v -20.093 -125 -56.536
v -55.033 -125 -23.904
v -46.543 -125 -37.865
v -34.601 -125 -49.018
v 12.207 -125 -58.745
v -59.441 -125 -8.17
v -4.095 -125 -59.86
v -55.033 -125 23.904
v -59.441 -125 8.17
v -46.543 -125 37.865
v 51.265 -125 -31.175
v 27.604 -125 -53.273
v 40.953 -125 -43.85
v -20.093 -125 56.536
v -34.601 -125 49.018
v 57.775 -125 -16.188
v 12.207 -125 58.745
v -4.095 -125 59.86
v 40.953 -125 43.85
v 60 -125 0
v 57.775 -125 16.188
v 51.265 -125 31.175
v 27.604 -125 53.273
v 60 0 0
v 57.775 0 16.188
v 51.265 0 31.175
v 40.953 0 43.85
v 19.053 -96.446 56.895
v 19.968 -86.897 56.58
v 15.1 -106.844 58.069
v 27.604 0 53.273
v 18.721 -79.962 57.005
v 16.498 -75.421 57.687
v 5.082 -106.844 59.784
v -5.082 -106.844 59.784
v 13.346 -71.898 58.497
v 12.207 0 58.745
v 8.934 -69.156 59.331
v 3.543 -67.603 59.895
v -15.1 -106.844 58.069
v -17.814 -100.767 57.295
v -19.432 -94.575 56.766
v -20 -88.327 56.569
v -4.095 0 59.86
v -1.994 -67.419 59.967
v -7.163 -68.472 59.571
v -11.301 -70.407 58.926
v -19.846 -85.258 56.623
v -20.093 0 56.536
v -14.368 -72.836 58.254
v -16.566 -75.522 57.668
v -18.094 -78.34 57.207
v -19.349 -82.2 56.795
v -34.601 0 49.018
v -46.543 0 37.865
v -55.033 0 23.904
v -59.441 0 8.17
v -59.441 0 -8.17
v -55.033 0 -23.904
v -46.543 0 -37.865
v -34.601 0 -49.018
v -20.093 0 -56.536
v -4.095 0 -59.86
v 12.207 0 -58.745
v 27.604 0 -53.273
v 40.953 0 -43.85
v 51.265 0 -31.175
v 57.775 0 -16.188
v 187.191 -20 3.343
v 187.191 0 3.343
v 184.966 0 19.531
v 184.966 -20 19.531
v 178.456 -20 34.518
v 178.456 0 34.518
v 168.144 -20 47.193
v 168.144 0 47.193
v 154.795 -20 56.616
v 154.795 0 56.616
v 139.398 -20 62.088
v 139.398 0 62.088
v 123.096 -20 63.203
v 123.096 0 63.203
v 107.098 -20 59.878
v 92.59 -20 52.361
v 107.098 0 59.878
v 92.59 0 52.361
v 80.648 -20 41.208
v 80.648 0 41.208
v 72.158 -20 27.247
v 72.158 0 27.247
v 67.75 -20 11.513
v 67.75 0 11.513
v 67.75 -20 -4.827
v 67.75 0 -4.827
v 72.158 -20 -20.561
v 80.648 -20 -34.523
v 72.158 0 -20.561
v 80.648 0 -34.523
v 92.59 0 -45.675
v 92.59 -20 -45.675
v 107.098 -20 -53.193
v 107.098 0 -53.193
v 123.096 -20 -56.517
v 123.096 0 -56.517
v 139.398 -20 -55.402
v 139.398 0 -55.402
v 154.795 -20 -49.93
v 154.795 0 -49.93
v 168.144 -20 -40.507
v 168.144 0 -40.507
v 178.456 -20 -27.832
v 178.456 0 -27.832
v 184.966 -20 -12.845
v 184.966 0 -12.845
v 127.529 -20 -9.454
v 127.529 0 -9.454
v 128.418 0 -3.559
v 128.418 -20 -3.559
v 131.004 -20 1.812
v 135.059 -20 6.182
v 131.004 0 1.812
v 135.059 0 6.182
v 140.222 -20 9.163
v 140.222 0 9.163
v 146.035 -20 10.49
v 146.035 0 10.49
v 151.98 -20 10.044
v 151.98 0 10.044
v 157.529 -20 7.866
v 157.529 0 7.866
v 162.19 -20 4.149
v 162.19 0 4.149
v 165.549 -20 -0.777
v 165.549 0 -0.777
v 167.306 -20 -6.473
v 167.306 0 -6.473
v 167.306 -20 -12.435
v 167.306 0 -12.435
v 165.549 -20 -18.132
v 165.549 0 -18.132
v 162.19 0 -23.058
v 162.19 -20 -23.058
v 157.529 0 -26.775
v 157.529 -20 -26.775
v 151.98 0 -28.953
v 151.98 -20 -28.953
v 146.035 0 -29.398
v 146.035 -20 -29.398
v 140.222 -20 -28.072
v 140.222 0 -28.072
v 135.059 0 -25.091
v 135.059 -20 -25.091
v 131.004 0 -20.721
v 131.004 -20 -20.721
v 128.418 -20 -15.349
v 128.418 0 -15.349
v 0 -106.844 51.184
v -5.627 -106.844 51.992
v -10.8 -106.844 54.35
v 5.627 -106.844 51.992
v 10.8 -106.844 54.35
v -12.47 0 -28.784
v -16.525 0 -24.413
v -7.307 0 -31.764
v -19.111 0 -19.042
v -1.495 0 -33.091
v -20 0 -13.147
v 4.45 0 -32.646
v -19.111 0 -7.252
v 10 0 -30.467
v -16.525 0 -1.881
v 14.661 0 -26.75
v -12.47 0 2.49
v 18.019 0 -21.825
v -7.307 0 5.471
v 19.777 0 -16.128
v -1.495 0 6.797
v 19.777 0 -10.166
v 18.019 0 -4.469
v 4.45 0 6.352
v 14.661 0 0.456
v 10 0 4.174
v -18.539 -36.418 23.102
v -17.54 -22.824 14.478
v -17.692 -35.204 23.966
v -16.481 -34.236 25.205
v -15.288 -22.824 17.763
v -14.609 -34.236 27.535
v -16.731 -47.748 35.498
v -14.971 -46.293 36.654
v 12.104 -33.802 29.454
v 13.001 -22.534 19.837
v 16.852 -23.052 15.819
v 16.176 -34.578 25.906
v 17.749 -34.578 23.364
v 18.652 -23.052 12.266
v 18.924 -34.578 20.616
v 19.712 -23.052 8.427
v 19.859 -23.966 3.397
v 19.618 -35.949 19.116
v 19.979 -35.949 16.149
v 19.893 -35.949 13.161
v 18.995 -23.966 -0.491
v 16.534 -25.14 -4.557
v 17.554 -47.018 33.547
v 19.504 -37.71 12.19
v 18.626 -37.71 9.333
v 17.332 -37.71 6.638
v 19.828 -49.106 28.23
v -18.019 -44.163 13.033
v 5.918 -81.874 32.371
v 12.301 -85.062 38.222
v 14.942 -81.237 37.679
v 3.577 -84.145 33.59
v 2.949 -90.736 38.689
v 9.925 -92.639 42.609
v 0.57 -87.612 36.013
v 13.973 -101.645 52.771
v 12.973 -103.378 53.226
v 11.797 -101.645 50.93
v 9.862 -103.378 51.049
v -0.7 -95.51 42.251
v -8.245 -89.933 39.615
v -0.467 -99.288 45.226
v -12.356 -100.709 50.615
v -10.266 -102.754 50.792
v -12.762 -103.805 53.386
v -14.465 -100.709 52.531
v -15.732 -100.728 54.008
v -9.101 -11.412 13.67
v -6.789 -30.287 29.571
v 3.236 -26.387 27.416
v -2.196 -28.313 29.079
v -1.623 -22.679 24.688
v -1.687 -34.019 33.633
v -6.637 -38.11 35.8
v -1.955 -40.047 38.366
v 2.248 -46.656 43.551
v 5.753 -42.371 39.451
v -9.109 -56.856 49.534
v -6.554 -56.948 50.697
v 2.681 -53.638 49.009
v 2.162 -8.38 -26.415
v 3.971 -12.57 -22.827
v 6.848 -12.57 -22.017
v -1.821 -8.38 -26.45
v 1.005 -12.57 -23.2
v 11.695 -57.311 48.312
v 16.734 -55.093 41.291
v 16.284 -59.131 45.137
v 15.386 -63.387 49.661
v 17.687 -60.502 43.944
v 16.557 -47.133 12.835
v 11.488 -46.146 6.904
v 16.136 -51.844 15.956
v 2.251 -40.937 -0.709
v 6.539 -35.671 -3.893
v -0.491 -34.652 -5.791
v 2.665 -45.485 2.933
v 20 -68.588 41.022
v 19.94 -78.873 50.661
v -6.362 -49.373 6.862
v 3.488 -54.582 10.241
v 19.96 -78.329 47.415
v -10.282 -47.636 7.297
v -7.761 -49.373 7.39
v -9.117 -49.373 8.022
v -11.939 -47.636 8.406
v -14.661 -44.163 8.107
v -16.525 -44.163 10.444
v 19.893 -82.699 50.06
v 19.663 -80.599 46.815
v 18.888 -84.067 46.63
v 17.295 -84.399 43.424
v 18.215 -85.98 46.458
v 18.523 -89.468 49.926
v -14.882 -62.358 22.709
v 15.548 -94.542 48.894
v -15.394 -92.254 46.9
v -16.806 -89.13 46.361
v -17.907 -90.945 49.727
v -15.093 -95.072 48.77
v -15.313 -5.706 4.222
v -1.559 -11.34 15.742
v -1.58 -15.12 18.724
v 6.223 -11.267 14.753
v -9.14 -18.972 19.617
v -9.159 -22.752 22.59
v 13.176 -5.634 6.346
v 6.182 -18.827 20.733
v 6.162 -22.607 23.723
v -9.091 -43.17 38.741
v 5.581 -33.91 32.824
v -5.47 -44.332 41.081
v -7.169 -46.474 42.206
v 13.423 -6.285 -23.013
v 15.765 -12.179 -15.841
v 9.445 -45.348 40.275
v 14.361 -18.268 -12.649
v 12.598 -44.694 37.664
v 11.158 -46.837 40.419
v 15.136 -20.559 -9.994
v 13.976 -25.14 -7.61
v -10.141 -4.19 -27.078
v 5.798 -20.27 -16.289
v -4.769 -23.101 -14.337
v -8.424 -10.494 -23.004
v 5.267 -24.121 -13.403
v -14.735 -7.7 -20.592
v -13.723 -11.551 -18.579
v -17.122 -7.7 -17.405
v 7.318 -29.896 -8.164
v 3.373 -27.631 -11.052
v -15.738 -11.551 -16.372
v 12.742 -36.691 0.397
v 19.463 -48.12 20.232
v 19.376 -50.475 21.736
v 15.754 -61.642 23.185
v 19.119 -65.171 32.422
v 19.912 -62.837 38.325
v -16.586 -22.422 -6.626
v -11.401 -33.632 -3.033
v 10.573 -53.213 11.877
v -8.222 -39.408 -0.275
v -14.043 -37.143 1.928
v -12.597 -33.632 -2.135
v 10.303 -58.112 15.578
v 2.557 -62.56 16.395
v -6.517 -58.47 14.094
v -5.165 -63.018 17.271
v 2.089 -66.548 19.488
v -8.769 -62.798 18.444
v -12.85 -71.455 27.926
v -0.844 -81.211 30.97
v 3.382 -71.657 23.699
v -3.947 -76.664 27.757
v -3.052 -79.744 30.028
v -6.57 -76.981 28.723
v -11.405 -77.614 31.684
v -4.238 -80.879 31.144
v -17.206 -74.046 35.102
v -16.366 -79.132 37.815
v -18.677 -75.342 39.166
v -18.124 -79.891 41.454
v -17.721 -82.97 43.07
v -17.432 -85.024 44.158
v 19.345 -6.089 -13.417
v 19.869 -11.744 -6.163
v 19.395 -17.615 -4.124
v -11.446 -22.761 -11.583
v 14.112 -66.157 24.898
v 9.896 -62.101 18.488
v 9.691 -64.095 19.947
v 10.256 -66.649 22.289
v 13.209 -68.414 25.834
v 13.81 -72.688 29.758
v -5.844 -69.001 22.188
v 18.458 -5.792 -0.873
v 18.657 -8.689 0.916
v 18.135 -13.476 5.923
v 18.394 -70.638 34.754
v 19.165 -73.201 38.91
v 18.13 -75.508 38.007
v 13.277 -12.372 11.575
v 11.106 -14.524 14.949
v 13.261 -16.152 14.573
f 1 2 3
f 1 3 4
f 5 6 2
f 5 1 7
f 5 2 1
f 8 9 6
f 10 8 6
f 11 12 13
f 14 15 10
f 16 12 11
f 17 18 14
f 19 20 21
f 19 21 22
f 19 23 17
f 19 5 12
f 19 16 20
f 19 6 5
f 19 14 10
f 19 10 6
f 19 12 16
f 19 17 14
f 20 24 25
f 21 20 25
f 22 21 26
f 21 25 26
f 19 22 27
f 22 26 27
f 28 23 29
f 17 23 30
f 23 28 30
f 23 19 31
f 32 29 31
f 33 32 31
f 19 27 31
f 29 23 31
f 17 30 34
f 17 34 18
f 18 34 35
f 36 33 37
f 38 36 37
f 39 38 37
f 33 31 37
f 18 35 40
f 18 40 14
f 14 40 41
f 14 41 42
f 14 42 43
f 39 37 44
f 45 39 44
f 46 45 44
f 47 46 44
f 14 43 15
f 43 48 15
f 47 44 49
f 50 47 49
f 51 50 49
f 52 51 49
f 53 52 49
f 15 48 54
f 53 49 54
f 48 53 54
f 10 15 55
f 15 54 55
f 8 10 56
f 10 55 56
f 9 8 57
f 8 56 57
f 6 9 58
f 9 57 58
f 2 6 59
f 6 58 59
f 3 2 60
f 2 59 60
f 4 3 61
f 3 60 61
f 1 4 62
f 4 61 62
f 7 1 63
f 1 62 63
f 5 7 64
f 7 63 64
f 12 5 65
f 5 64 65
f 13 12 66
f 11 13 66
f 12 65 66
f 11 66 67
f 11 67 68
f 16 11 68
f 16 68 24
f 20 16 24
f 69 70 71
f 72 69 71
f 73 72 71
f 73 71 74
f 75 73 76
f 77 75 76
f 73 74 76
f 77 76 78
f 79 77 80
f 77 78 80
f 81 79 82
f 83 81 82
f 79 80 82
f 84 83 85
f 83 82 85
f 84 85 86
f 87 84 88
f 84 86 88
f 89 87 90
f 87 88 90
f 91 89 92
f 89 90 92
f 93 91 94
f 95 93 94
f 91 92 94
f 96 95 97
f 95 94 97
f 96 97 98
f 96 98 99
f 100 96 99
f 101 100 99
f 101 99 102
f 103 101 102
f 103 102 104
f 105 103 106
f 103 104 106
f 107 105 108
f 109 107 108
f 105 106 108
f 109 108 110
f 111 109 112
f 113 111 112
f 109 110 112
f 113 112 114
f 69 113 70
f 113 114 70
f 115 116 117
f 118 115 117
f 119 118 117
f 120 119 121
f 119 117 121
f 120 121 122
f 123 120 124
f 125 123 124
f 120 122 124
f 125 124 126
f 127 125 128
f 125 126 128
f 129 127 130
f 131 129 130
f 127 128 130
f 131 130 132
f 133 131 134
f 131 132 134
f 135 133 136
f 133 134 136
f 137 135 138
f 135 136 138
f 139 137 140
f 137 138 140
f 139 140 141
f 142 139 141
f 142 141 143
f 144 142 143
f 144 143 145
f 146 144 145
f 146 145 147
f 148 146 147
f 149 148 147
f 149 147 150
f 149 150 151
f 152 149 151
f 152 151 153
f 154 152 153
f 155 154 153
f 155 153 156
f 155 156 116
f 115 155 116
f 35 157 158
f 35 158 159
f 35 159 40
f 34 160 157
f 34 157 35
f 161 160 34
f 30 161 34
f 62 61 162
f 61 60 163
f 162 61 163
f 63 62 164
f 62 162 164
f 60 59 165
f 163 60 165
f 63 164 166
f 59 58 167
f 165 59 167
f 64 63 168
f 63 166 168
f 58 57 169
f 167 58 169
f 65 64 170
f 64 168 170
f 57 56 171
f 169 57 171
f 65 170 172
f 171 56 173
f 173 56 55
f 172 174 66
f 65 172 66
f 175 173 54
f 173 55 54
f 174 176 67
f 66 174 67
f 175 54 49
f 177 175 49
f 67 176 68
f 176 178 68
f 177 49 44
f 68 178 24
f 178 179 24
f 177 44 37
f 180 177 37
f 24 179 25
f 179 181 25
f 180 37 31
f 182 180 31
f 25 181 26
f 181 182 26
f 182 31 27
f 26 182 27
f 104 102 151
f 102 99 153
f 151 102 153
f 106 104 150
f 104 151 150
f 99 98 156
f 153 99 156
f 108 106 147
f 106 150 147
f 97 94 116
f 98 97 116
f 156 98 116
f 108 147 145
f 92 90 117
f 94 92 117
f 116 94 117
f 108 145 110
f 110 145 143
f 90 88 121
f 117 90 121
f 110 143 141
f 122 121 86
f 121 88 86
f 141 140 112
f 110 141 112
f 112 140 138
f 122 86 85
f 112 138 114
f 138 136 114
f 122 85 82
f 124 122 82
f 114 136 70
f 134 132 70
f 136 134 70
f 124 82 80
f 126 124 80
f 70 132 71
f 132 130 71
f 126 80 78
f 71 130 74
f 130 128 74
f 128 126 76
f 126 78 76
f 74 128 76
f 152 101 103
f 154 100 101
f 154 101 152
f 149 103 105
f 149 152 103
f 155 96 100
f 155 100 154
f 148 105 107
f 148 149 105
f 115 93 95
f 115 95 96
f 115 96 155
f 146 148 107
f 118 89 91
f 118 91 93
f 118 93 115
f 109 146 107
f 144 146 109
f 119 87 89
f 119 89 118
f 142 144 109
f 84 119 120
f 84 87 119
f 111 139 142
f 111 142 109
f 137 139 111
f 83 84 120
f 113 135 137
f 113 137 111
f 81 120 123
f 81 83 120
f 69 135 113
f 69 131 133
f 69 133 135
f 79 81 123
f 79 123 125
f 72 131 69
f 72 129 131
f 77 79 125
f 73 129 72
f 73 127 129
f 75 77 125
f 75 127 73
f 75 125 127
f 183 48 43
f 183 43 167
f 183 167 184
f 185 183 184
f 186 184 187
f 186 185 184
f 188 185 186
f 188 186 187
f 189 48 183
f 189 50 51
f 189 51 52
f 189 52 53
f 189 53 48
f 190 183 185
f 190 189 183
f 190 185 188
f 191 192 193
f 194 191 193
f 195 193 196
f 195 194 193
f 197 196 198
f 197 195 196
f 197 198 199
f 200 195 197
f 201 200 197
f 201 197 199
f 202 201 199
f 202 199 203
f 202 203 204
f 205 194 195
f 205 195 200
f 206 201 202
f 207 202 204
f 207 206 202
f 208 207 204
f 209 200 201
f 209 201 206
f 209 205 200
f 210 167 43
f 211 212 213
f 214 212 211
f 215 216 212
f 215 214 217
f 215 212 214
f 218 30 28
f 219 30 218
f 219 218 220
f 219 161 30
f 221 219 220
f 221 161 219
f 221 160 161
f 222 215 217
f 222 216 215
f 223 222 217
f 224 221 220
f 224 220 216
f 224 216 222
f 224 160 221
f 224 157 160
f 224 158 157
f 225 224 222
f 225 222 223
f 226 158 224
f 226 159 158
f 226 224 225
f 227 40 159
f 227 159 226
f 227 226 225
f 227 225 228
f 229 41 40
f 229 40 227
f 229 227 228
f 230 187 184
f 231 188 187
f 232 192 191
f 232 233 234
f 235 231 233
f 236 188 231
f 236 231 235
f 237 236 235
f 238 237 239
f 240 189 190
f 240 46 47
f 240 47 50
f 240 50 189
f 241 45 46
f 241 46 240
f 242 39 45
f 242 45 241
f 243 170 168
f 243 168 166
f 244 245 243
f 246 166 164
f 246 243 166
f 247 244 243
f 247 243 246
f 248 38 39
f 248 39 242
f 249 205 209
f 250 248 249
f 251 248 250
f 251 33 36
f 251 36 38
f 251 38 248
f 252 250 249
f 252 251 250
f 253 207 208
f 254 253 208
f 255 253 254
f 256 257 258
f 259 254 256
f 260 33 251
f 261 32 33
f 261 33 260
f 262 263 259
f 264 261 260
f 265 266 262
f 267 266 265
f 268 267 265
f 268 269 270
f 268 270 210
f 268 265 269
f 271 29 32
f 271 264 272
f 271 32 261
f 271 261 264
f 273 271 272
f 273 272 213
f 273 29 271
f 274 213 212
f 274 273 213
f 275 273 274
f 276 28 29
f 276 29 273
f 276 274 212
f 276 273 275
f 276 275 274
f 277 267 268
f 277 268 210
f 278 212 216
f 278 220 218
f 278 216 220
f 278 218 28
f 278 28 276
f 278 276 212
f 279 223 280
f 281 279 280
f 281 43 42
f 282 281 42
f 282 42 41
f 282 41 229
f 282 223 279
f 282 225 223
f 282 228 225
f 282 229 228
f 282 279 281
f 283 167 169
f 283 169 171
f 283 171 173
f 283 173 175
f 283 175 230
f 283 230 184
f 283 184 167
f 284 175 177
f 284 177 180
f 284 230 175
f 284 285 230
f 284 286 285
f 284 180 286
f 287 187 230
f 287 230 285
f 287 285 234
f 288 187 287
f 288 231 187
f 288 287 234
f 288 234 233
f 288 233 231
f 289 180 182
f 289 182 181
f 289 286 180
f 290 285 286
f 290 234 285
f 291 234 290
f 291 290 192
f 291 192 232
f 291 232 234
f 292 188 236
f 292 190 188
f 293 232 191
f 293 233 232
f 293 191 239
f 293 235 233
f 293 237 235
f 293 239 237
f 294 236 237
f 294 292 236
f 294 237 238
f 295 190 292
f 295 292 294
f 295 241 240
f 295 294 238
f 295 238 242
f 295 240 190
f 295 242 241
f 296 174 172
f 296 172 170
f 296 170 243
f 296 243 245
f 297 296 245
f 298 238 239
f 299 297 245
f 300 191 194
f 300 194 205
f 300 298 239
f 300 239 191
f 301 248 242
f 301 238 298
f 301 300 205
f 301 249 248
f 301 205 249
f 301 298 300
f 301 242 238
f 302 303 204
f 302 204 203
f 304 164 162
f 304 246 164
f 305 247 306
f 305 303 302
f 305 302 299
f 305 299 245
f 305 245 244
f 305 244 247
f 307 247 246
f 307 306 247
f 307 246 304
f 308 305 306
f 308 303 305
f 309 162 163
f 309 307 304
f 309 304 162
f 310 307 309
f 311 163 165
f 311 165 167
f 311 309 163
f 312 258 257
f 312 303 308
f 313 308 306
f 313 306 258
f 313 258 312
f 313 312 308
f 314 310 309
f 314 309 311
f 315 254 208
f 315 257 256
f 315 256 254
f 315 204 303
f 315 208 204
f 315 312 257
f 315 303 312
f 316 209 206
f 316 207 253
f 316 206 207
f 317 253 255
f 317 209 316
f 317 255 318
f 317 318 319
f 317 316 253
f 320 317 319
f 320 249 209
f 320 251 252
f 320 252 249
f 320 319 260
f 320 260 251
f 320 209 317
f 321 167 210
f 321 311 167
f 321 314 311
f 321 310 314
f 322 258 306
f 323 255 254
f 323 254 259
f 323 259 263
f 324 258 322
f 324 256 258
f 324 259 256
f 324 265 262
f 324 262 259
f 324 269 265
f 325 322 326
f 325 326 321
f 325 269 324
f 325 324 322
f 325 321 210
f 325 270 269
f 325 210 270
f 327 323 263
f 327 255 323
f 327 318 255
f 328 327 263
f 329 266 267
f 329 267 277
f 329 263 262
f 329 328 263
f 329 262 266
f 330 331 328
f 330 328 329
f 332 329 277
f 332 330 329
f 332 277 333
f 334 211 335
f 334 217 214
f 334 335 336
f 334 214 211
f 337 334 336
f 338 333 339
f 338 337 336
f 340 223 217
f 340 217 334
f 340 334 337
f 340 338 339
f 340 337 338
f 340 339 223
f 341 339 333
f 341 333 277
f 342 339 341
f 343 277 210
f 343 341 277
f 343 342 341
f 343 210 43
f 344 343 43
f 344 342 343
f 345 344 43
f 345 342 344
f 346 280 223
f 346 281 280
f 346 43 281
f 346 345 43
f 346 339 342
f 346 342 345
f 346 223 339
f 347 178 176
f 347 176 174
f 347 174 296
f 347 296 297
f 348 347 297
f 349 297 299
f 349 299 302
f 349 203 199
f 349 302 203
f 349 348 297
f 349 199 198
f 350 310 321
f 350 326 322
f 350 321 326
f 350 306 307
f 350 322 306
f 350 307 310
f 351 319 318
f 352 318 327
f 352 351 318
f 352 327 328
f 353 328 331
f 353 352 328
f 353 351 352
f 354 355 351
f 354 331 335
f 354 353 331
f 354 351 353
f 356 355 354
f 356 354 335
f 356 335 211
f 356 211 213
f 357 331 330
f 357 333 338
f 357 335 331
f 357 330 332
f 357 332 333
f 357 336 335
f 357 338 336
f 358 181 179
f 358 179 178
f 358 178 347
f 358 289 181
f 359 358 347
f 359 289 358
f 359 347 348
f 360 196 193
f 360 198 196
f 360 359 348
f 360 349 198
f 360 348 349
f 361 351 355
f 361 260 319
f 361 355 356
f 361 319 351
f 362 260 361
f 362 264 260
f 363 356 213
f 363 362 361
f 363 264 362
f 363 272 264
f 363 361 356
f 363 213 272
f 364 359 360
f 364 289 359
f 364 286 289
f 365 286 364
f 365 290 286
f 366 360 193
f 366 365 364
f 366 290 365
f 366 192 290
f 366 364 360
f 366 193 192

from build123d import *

# Parameters (mm, degrees)
F0_R     = 60
F1_DEPTH = 125
F2_R     = 20
F5_R     = 60
F6_DEPTH = 20
F7_R     = 20
F8_DEPTH = 30


with BuildPart() as f1:
    # F0 (on Front) → F1 (new body)
    with BuildSketch(Plane.XZ):
        Circle(F0_R)
    extrude(amount=F1_DEPTH)

    # F4: sweep along a path in F3
    with BuildLine(Plane.YZ) as f4_path:
        Line((0, -25.435504), (-106.843635, 58.895227))
    # F2 (on face) → F4 (sweep, cut)
    with BuildSketch(Plane(origin=(0, 0, 0), x_dir=(-1, 0, 0), z_dir=(0, 1, 0))):
        with Locations((0, -13.146971)):
            Circle(F2_R)
    sweep(path=f4_path.line, mode=Mode.SUBTRACT)


with BuildPart() as f6:
    # F5 (on Front) → F6 (new body)
    with BuildSketch(Plane.XZ):
        with Locations((127.190962, 3.342743)):
            Circle(F5_R)
    extrude(amount=F6_DEPTH)

    # F7 (on face) → F8 (cut)
    with BuildSketch(Plane(origin=(0, 0, 0), x_dir=(-1, 0, 0), z_dir=(0, 1, 0))):
        with Locations((-147.52914, -9.454308)):
            Circle(F7_R)
    extrude(amount=-F8_DEPTH, mode=Mode.SUBTRACT)


solid = Compound([f1.part, f6.part])
